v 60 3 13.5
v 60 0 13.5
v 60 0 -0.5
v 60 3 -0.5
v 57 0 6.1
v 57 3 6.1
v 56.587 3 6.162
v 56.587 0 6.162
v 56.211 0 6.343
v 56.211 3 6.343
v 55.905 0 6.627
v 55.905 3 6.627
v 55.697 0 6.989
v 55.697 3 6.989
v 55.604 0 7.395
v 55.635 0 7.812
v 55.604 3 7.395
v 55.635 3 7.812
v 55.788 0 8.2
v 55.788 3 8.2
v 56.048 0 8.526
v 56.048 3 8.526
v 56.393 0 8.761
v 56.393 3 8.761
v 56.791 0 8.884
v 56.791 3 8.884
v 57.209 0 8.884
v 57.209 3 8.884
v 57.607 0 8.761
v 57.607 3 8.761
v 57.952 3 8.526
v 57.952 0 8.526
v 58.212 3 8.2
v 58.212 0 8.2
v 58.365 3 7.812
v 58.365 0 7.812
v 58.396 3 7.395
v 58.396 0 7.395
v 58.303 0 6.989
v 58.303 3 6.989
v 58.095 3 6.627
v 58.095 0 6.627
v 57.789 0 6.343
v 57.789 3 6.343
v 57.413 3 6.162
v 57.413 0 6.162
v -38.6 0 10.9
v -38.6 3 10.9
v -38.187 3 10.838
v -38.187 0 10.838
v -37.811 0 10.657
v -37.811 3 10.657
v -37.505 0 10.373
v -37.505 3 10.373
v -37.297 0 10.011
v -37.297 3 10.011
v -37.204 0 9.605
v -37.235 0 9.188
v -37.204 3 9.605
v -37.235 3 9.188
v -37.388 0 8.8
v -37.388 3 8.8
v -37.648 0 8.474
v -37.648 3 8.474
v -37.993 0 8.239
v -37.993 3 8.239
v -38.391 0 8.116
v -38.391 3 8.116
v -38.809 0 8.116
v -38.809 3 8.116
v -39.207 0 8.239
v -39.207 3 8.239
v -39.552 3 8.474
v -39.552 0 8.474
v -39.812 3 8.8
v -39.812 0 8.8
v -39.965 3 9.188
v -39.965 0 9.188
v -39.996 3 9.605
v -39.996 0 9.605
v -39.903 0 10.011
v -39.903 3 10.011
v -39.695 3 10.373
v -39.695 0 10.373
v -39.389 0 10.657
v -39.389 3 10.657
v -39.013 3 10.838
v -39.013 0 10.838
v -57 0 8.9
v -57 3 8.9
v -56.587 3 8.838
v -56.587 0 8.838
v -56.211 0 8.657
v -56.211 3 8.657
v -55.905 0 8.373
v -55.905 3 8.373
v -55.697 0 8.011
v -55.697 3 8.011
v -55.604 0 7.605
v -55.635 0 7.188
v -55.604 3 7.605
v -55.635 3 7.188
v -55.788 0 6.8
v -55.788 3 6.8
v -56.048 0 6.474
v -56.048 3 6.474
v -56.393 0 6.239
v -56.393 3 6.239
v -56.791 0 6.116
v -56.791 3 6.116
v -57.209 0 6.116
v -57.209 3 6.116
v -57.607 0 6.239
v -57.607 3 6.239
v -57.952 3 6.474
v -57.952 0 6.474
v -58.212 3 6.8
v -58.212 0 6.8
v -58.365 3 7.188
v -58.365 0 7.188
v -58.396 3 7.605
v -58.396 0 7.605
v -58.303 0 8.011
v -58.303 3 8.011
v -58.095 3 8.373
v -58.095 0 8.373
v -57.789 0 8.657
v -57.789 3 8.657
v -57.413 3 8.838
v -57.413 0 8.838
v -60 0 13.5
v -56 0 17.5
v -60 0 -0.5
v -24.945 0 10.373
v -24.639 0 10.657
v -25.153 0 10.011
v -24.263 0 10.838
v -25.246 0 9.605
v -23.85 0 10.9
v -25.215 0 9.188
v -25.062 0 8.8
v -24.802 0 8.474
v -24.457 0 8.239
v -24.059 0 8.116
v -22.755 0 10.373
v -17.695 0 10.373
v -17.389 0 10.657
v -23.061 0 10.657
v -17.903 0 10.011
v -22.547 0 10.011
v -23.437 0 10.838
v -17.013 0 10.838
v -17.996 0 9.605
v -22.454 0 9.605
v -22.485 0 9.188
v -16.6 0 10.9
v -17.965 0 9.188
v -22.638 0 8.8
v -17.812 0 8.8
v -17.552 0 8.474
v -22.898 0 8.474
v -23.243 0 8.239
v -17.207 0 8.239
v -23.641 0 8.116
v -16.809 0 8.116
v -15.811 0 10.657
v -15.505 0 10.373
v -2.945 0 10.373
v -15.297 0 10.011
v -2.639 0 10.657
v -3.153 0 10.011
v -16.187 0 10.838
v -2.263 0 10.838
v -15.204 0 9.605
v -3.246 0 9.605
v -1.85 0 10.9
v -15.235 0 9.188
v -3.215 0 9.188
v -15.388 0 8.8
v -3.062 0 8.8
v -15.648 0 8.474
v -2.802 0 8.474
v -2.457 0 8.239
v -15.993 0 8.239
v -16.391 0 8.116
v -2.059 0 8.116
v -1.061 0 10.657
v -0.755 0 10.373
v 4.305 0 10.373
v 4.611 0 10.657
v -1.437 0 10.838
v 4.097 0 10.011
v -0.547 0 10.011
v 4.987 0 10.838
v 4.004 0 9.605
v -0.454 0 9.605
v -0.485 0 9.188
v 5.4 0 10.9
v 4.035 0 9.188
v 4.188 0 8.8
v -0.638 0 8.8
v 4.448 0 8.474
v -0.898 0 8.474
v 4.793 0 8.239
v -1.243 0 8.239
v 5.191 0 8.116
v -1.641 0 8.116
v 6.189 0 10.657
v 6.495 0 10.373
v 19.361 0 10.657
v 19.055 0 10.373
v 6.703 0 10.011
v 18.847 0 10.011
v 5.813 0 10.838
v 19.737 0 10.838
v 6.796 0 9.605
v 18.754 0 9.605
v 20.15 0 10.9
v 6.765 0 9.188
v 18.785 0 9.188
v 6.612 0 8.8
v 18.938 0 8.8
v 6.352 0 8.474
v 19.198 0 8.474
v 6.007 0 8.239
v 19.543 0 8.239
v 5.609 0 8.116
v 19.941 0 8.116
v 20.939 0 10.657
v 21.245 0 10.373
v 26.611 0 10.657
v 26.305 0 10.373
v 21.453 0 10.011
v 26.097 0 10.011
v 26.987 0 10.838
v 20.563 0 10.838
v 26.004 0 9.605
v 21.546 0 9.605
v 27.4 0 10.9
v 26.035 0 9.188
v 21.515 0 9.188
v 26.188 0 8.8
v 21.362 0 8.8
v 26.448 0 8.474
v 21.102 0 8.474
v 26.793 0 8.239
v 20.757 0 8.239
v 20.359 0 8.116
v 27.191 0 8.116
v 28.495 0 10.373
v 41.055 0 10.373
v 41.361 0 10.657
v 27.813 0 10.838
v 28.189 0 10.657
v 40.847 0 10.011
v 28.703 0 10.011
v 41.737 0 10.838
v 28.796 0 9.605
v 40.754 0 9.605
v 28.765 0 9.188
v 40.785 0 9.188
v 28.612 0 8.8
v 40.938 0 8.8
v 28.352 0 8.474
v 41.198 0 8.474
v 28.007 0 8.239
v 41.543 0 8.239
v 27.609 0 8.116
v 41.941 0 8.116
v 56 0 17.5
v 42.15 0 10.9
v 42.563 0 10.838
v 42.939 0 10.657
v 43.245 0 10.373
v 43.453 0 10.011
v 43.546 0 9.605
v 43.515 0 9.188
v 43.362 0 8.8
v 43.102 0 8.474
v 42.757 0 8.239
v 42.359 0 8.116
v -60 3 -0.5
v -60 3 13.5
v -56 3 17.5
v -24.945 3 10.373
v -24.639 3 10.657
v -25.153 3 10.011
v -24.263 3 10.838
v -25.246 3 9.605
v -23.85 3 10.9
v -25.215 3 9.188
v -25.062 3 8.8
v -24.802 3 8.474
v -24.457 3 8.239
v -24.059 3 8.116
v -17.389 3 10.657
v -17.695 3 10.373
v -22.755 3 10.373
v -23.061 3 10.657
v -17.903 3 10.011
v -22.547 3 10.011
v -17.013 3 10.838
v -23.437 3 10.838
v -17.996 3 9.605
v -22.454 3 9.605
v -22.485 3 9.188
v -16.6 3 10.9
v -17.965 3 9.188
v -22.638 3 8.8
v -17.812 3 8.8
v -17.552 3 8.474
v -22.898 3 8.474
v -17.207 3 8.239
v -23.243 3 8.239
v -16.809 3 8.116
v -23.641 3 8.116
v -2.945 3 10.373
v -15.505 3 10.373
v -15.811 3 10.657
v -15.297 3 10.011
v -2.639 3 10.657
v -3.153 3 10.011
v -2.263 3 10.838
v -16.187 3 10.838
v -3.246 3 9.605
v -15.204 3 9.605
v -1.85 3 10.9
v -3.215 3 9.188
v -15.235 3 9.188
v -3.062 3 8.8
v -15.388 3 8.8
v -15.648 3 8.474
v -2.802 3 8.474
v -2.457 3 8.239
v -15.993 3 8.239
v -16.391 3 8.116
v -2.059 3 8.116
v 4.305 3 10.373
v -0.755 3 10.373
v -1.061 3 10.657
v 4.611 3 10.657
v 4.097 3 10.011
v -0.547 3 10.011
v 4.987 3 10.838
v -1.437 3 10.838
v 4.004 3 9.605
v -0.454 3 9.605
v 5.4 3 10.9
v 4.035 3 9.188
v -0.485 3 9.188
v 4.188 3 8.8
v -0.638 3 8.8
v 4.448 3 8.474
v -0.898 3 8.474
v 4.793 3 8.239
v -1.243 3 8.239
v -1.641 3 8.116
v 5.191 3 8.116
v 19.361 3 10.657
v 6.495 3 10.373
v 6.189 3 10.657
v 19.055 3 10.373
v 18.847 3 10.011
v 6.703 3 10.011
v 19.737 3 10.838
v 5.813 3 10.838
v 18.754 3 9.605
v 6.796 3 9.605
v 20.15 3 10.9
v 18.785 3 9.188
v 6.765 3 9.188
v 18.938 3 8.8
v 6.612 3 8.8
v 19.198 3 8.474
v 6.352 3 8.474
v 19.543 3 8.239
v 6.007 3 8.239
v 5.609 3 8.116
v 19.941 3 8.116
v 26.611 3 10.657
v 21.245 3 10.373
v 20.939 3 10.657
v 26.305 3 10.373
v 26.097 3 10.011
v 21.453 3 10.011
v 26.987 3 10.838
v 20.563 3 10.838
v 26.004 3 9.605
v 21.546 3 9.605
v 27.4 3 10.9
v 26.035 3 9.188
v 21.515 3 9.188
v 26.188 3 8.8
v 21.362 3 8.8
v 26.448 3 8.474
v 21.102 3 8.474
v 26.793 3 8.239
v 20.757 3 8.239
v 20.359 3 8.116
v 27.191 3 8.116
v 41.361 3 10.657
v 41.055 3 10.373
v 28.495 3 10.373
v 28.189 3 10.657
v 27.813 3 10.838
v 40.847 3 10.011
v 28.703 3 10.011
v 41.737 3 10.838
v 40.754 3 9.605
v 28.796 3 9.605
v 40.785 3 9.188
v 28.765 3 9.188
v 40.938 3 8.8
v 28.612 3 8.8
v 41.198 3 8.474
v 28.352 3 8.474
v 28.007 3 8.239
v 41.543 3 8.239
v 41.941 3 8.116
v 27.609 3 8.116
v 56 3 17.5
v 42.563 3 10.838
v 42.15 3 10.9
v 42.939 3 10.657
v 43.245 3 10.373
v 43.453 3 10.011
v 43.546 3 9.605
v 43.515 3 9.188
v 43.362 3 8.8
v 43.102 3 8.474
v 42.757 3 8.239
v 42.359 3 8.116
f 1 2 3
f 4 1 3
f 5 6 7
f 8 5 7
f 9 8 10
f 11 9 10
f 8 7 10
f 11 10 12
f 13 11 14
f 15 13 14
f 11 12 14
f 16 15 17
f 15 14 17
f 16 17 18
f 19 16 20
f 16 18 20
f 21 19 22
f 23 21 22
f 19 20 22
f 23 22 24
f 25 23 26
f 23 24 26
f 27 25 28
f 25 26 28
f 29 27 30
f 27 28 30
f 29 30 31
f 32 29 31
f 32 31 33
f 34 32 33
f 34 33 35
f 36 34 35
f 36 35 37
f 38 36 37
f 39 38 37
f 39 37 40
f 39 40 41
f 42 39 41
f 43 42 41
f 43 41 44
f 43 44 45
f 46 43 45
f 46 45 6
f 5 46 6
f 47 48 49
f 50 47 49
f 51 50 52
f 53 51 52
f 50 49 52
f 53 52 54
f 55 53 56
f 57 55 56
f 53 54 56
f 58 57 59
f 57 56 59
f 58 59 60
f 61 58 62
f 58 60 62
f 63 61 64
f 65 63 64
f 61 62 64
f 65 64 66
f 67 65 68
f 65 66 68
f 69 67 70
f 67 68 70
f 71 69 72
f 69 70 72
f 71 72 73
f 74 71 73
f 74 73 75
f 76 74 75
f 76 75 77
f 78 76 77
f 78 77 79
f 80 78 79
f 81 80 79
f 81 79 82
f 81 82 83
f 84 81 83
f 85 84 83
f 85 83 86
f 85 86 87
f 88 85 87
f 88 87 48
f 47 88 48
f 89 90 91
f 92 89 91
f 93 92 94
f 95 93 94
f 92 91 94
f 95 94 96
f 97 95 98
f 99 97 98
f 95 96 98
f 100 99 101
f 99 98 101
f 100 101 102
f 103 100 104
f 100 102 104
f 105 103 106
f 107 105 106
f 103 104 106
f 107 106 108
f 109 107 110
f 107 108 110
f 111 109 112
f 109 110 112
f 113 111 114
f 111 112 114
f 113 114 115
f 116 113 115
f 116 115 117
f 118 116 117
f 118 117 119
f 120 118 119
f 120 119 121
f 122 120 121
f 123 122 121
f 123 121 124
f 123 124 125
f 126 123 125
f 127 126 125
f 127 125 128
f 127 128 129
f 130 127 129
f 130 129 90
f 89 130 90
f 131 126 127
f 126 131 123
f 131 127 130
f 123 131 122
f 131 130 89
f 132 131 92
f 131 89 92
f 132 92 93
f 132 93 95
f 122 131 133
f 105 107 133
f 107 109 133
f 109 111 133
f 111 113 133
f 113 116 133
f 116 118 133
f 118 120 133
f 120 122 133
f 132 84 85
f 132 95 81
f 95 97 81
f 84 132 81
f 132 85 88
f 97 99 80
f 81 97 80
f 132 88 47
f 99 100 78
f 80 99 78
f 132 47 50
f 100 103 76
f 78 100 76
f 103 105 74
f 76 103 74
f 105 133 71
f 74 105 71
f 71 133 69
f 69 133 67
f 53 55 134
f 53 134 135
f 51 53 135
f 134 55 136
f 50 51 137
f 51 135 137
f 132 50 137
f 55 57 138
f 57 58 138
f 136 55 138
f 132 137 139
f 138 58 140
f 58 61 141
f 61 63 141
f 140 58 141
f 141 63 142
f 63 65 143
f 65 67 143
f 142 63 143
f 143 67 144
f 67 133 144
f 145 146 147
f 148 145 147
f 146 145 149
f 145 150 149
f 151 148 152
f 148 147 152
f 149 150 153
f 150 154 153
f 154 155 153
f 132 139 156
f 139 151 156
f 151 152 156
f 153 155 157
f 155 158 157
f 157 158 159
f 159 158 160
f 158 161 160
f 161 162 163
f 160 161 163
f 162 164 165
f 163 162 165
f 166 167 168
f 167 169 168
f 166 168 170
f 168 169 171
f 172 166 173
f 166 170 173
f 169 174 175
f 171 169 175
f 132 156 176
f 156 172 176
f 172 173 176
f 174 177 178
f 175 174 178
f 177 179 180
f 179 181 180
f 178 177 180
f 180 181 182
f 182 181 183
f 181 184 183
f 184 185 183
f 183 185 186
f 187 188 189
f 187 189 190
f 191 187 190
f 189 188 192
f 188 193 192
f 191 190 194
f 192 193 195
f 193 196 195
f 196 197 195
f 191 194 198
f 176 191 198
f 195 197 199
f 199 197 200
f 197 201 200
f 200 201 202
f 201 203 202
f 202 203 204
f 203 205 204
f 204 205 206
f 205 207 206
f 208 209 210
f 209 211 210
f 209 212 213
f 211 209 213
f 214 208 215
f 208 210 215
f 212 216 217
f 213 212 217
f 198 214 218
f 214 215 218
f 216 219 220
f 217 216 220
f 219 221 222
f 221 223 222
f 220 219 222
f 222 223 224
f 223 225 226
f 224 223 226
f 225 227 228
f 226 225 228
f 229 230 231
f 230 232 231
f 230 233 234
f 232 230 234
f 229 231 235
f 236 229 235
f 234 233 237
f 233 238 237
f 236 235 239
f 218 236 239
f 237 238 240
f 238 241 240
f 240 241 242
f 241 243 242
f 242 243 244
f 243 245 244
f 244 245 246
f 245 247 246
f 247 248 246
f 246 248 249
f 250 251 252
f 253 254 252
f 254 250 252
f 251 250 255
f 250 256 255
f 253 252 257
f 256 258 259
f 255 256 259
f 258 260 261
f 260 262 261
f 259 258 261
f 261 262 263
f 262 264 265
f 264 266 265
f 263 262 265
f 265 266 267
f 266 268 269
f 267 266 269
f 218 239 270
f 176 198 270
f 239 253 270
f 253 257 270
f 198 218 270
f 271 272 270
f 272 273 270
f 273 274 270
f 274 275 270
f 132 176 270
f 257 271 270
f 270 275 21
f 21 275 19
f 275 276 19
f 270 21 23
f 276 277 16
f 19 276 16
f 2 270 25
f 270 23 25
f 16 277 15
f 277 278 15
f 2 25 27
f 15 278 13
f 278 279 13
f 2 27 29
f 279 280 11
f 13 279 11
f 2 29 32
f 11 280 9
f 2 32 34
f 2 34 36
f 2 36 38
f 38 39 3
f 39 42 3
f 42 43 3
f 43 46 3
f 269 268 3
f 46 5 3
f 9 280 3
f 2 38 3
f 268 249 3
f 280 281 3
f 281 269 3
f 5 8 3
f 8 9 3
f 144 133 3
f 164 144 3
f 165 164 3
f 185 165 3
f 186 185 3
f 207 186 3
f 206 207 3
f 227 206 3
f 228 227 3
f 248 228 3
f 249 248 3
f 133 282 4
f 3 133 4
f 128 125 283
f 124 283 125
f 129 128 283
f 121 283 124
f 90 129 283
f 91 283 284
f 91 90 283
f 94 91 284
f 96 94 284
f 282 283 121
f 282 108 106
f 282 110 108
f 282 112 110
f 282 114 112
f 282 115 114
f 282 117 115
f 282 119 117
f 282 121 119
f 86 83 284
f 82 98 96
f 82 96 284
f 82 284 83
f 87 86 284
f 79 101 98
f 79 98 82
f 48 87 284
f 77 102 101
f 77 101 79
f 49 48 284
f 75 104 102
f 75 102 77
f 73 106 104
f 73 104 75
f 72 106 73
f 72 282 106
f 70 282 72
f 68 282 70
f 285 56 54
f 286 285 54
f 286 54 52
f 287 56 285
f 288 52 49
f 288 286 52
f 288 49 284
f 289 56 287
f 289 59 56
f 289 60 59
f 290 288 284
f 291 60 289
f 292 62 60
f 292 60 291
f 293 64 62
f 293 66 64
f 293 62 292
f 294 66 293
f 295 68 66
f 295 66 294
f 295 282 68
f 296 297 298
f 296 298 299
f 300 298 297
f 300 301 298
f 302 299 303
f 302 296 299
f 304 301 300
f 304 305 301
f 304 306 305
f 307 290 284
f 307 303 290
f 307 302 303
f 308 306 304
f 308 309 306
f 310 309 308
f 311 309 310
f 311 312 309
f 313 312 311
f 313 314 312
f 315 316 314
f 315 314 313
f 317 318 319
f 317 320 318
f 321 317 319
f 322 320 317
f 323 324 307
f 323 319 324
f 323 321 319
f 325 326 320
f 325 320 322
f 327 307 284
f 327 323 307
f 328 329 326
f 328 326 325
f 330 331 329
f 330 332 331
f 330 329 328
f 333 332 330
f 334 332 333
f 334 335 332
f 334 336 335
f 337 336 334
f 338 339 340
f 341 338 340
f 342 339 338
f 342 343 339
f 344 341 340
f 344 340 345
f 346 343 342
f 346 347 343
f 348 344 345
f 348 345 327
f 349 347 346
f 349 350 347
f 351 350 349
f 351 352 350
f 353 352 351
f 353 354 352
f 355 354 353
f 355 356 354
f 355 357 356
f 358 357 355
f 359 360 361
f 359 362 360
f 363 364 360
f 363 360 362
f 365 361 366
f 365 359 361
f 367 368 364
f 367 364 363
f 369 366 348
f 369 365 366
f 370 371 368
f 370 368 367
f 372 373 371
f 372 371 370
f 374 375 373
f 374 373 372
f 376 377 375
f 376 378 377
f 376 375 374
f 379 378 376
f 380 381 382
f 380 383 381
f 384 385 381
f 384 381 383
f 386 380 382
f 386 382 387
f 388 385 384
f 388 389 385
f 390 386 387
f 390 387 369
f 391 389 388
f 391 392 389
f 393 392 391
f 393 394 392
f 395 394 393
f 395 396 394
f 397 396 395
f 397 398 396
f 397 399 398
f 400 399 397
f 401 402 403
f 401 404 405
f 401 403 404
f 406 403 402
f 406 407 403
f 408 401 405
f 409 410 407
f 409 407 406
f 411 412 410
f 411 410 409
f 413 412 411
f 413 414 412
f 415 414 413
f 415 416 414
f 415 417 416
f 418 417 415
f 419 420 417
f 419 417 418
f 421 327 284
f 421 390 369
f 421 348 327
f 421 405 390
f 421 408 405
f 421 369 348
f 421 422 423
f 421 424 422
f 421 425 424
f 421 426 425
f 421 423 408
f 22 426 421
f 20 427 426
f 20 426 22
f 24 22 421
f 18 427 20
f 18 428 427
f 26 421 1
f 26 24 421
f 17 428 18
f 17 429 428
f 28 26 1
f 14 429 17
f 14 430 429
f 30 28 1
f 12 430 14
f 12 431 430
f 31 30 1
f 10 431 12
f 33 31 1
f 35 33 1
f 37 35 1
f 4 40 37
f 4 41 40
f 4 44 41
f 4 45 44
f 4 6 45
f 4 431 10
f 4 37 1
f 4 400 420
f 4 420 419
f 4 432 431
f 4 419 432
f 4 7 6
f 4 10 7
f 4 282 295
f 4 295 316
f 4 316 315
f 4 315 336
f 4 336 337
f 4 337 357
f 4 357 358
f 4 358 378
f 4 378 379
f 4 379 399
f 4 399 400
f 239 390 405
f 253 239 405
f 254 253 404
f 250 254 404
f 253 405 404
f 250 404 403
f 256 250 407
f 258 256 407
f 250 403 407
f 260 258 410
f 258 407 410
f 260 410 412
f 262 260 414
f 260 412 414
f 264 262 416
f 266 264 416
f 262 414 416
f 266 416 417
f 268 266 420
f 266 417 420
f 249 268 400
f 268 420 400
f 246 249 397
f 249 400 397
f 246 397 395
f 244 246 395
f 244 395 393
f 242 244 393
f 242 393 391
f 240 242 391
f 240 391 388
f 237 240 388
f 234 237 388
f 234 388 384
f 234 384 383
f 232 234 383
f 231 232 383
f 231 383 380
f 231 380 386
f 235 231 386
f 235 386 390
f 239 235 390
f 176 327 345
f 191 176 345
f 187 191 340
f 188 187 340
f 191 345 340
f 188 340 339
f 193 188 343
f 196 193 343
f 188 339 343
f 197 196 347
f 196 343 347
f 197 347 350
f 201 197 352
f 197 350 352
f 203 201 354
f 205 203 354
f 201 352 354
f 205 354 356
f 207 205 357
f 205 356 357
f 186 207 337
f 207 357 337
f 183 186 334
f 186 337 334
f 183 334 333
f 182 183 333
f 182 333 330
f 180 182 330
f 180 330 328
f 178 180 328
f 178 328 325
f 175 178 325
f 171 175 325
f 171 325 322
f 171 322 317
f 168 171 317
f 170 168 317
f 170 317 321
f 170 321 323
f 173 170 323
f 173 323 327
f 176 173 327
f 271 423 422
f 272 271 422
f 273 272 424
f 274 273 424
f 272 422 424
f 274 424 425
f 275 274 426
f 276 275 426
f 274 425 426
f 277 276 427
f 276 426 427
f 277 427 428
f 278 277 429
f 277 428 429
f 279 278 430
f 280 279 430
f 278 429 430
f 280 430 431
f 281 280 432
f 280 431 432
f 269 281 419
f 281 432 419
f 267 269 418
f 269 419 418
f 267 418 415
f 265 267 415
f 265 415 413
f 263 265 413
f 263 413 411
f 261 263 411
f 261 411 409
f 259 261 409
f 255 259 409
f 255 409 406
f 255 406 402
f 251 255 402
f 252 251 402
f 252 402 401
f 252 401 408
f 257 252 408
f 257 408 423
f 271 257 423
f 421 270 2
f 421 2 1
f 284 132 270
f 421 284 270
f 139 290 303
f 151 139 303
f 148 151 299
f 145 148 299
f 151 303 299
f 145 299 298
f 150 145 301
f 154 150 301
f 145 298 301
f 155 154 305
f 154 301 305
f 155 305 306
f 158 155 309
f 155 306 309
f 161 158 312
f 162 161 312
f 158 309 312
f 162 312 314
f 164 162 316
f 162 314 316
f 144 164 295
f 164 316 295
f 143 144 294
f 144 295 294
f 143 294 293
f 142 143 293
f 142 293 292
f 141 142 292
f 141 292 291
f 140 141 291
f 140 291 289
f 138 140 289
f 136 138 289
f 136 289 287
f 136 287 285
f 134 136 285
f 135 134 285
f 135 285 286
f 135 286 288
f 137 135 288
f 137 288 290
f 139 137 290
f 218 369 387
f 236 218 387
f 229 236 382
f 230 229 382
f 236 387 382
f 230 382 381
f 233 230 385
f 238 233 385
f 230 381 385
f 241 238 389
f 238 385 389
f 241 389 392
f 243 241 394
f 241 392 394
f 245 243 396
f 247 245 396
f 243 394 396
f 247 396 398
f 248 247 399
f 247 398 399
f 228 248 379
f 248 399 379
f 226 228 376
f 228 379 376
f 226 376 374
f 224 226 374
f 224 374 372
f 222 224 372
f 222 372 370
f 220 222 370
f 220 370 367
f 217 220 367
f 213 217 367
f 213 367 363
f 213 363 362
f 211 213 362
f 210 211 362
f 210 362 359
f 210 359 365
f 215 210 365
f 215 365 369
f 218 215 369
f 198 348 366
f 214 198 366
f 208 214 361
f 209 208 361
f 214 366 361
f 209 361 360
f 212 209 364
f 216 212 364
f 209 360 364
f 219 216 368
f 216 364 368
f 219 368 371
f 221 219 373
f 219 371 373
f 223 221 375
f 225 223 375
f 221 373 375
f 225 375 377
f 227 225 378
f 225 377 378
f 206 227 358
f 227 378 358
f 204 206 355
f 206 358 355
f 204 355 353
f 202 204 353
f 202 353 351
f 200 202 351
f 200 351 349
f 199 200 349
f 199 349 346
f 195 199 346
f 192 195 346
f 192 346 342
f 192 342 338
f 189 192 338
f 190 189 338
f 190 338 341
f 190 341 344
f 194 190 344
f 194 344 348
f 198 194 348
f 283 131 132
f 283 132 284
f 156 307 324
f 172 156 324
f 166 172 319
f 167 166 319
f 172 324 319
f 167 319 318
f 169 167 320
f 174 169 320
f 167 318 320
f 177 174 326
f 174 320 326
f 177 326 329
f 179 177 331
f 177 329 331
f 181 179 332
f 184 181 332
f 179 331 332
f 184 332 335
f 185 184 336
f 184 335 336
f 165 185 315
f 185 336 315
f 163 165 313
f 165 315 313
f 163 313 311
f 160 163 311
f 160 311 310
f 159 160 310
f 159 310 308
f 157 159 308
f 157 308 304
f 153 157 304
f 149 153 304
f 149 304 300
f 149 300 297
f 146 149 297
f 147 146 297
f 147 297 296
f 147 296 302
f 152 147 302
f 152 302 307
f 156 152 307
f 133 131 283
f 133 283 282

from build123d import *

# Parameters (mm, degrees)
SKETCH_1_W          = 120
SKETCH_1_H          = 35
EXTRUDE_1_DEPTH     = 3
SKETCH_2_W          = 30
SKETCH_2_H          = 17
CUT_EXTRUDE_1_DEPTH = 63.571958576
SKETCH_3_R          = 1.4
CUT_EXTRUDE_2_DEPTH = 63.571958576
SKETCH_4_R          = 1.4
CUT_EXTRUDE_3_DEPTH = 63.571958576
SKETCH_5_W          = 10
SKETCH_5_H          = 5
CUT_EXTRUDE_4_DEPTH = 63.571958576
CHAMFER_1_SIZE      = 4
CHAMFER_1_SIZE2     = 8.578027682
CHAMFER_2_SIZE      = 4
CHAMFER_2_SIZE2     = 8.578027682
FILLET_1_R          = 5
CHAMFER_3_SIZE      = 4
SKETCH_6_W          = 120
SKETCH_6_H          = 17
CUT_EXTRUDE_5_DEPTH = 63.571958576


with BuildPart() as part:
    # 草图1 → 凸台-拉伸1 (new body)
    with BuildSketch(Plane(origin=(0, 0, 0), x_dir=(1, 0, 0), z_dir=(0, 1, 0))):
        Rectangle(SKETCH_1_W, SKETCH_1_H)
    extrude(amount=EXTRUDE_1_DEPTH)

    # 草图2 → 切除-拉伸1 (cut, through all)
    with BuildSketch(Plane(origin=(0, 3, 0), x_dir=(1, 0, 0), z_dir=(0, 1, 0))):
        with Locations((0, 9)):
            Rectangle(SKETCH_2_W, SKETCH_2_H)
    extrude(amount=-CUT_EXTRUDE_1_DEPTH, mode=Mode.SUBTRACT)

    # 草图3 → 切除-拉伸2 (cut, through all)
    with BuildSketch(Plane(origin=(0, 3, 0), x_dir=(1, 0, 0), z_dir=(0, 1, 0))):
        with Locations(Location((-57, 12.5, 0), (0, 0, 270))):
            Circle(SKETCH_3_R)
        with Locations(Location((-57, -7.5, 0), (0, 0, 270))):
            Circle(SKETCH_3_R)
        with Locations(Location((57, -7.5, 0), (0, 0, 90))):
            Circle(SKETCH_3_R)
        with Locations(Location((57, 12.5, 0), (0, 0, 90))):
            Circle(SKETCH_3_R)
    extrude(amount=-CUT_EXTRUDE_2_DEPTH, mode=Mode.SUBTRACT)

    # 草图4 → 切除-拉伸3 (cut, through all)
    with BuildSketch(Plane(origin=(0, 3, 0), x_dir=(1, 0, 0), z_dir=(0, 1, 0))):
        with Locations(Location((5.4, -9.5, 0), (0, 0, 270))):
            Circle(SKETCH_4_R)
        with Locations(Location((20.15, -9.5, 0), (0, 0, 270))):
            Circle(SKETCH_4_R)
        with Locations(Location((27.4, -9.5, 0), (0, 0, 270))):
            Circle(SKETCH_4_R)
        with Locations(Location((42.15, -9.5, 0), (0, 0, 270))):
            Circle(SKETCH_4_R)
        with Locations(Location((-1.85, -9.5, 0), (0, 0, 270))):
            Circle(SKETCH_4_R)
        with Locations(Location((-16.6, -9.5, 0), (0, 0, 270))):
            Circle(SKETCH_4_R)
        with Locations(Location((-23.85, -9.5, 0), (0, 0, 270))):
            Circle(SKETCH_4_R)
        with Locations(Location((-38.6, -9.5, 0), (0, 0, 270))):
            Circle(SKETCH_4_R)
    extrude(amount=-CUT_EXTRUDE_3_DEPTH, mode=Mode.SUBTRACT)

    # 草图5 → 切除-拉伸4 (cut, through all)
    with BuildSketch(Plane(origin=(0, 3, 0), x_dir=(1, 0, 0), z_dir=(0, 1, 0))):
        with Locations((-30, 7.5)):
            Rectangle(SKETCH_5_W, SKETCH_5_H)
        with Locations((30, 7.5)):
            Rectangle(SKETCH_5_W, SKETCH_5_H)
    extrude(amount=-CUT_EXTRUDE_4_DEPTH, mode=Mode.SUBTRACT)

    # 倒角1
    chamfer_1_edges = [part.edges().sort_by_distance(p)[0] for p in [
        (-15, 1.5, -17.5),
    ]]
    chamfer_1_side = [part.faces().sort_by_distance(p)[0] for p in [
        (-37.5, 1.5, -17.5),
    ]]
    chamfer(chamfer_1_edges, length=CHAMFER_1_SIZE, length2=CHAMFER_1_SIZE2, reference=chamfer_1_side[0])

    # 倒角2
    chamfer_2_edges = [part.edges().sort_by_distance(p)[0] for p in [
        (15, 1.5, -17.5),
    ]]
    chamfer_2_side = [part.faces().sort_by_distance(p)[0] for p in [
        (37.5, 1.5, -17.5),
    ]]
    chamfer(chamfer_2_edges, length=CHAMFER_2_SIZE, length2=CHAMFER_2_SIZE2, reference=chamfer_2_side[0])

    # 圆角1
    fillet_1_edges = [part.edges().sort_by_distance(p)[0] for p in [
        (-15, 1.5, -0.5),
        (15, 1.5, -0.5),
    ]]
    fillet(fillet_1_edges, radius=FILLET_1_R)

    # 倒角3
    chamfer_3_edges = [part.edges().sort_by_distance(p)[0] for p in [
        (60, 1.5, 17.5),
        (-60, 1.5, 17.5),
    ]]
    chamfer(chamfer_3_edges, length=CHAMFER_3_SIZE)

    # 草图6 → 切除-拉伸5 (cut, through all)
    with BuildSketch(Plane(origin=(0, 3, 0), x_dir=(1, 0, 0), z_dir=(0, 1, 0))):
        with Locations((0, 9)):
            Rectangle(SKETCH_6_W, SKETCH_6_H)
    extrude(amount=-CUT_EXTRUDE_5_DEPTH, mode=Mode.SUBTRACT)


solid = part.part
